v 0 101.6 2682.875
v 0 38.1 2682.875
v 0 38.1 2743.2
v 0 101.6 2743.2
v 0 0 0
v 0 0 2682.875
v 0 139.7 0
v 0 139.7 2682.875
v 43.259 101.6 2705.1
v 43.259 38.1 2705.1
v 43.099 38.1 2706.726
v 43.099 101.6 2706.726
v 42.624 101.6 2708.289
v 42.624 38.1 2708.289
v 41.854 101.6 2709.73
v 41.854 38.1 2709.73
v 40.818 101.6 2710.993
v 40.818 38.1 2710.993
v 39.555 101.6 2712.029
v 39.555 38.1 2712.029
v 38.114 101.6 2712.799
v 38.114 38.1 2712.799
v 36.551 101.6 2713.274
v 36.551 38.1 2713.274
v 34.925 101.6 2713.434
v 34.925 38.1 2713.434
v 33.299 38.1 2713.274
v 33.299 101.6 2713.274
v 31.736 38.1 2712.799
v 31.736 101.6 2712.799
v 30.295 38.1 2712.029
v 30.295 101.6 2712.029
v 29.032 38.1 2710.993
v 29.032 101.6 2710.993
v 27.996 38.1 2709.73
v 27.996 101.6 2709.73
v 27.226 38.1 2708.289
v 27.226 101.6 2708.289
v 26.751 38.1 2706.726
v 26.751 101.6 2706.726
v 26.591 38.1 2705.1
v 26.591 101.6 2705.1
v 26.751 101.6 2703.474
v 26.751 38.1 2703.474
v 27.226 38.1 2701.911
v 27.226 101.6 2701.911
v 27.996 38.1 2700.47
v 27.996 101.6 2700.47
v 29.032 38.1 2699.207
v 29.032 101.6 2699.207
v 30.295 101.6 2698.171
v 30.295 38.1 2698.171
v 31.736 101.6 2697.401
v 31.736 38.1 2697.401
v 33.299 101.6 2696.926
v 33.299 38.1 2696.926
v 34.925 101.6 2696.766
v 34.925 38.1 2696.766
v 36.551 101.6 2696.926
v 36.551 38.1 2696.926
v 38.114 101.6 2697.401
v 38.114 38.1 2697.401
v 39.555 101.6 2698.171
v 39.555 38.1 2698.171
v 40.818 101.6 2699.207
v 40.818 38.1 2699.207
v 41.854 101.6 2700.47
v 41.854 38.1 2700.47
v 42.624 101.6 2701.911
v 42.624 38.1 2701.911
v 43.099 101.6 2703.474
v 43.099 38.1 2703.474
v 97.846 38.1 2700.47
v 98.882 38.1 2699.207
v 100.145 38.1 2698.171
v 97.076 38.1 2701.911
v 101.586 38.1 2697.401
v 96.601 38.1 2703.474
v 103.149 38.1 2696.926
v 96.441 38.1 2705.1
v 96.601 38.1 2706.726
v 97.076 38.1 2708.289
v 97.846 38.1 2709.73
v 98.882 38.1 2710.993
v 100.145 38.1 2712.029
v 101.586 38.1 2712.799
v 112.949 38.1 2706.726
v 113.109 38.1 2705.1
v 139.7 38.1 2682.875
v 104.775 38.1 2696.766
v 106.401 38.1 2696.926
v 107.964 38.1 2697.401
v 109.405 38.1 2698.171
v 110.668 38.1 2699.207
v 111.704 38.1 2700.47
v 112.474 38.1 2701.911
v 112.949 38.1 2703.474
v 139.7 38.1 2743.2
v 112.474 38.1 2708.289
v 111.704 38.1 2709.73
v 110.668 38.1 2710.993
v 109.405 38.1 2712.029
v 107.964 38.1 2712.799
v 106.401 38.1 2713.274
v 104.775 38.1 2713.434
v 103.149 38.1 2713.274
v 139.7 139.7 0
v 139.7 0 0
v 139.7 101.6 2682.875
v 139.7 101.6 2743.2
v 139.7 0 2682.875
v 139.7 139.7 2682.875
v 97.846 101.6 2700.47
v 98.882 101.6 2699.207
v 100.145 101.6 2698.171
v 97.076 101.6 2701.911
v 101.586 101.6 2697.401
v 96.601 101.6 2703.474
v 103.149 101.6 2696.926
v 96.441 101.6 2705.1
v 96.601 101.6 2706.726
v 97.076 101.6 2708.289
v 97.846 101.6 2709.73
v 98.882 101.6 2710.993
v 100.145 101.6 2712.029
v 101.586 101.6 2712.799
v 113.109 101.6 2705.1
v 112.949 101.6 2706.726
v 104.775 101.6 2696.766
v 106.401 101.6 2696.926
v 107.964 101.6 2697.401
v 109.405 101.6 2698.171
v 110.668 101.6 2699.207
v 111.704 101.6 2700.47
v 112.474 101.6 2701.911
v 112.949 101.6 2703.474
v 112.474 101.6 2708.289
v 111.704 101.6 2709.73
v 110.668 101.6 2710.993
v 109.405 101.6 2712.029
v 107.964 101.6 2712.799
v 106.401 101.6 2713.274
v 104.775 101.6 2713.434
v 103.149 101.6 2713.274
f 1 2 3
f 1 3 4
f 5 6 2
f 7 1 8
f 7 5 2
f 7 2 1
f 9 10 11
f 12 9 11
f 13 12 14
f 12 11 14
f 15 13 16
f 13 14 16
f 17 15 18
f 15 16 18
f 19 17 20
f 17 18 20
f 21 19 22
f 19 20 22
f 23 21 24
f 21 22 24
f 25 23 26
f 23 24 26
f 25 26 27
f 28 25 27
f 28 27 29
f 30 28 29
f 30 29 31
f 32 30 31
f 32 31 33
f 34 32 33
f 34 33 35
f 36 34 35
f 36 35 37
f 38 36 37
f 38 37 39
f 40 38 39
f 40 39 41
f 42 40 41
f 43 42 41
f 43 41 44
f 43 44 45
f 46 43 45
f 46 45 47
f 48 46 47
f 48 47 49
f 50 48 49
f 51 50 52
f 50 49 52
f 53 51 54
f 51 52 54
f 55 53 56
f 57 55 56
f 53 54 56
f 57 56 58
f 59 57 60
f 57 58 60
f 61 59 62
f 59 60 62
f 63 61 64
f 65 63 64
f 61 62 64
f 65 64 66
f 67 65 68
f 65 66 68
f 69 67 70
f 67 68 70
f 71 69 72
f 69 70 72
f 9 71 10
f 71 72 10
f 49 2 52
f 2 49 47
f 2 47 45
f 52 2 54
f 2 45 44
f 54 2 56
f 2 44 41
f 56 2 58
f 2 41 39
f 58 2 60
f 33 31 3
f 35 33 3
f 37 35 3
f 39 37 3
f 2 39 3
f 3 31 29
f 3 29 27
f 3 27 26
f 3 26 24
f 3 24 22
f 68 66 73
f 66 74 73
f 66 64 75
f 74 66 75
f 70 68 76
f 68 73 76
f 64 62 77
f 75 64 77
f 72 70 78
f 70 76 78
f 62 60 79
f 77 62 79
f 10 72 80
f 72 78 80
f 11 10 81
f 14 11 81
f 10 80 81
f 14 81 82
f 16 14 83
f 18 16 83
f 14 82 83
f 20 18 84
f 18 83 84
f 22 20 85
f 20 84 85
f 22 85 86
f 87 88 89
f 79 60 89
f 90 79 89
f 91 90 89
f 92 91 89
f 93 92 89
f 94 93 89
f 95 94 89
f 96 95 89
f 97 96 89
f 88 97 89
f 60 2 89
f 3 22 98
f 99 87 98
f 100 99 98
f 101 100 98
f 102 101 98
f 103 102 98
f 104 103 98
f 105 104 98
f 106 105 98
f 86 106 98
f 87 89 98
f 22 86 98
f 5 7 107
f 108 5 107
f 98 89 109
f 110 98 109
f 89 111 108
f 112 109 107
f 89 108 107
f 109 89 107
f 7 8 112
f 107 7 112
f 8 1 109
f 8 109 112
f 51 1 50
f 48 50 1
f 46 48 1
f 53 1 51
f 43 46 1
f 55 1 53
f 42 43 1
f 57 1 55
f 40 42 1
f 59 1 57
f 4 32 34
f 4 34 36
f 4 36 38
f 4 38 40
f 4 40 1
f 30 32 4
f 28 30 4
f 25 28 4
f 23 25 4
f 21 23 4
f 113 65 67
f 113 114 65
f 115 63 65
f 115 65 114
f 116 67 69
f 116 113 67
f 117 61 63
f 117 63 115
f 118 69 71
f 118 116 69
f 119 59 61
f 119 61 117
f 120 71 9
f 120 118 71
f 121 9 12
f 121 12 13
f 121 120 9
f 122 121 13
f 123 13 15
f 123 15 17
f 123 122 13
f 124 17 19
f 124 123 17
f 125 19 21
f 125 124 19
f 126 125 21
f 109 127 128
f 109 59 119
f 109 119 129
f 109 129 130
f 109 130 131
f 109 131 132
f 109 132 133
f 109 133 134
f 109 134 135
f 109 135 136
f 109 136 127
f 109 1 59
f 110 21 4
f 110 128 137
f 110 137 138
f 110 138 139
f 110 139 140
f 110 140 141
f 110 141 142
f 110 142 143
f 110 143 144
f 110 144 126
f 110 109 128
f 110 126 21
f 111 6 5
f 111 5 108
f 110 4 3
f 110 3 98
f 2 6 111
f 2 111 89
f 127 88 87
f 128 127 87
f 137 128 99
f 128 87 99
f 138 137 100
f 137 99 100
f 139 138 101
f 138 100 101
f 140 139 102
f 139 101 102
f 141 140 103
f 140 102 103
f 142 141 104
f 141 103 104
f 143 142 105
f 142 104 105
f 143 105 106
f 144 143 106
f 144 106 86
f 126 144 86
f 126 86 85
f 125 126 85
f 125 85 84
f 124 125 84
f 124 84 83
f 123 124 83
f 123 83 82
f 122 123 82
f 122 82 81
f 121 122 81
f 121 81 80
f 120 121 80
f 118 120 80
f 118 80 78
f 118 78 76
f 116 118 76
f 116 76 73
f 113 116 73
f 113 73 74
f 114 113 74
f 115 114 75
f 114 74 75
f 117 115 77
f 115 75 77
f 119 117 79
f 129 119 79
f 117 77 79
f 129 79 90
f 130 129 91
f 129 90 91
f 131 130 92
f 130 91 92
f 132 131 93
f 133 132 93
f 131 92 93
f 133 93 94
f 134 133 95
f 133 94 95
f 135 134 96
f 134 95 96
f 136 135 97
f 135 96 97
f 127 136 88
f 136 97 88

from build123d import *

# Parameters (mm, degrees)
F0_W     = 139.7
F0_H     = 139.7
F1_DEPTH = 2743.2
F2_W     = 38.1
F2_H     = 60.325
F3_DEPTH = 139.701
F5_D     = 16.66748


with BuildPart() as f1:
    # F0 (on Top) → F1 (new body)
    with BuildSketch(Plane.XY):
        with Locations((69.85, 69.85)):
            Rectangle(F0_W, F0_H)
    extrude(amount=F1_DEPTH)

    # F2 (on face) → F3 (cut, through all)
    with BuildSketch(Plane.YZ.offset(139.7)):
        with Locations((19.05, 2713.0375)):
            Rectangle(F2_W, F2_H)
        with Locations((120.65, 2713.0375)):
            Rectangle(F2_W, F2_H)
    extrude(amount=-F3_DEPTH, mode=Mode.SUBTRACT)

    # F5 (through all)
    with Locations(Plane(origin=(0, 139.7, 0), x_dir=(-1, 0, 0), z_dir=(0, 1, 0))):
        with Locations((-104.775, 2705.1), (-34.925, 2705.1)):
            Hole(F5_D / 2)


solid = f1.part
